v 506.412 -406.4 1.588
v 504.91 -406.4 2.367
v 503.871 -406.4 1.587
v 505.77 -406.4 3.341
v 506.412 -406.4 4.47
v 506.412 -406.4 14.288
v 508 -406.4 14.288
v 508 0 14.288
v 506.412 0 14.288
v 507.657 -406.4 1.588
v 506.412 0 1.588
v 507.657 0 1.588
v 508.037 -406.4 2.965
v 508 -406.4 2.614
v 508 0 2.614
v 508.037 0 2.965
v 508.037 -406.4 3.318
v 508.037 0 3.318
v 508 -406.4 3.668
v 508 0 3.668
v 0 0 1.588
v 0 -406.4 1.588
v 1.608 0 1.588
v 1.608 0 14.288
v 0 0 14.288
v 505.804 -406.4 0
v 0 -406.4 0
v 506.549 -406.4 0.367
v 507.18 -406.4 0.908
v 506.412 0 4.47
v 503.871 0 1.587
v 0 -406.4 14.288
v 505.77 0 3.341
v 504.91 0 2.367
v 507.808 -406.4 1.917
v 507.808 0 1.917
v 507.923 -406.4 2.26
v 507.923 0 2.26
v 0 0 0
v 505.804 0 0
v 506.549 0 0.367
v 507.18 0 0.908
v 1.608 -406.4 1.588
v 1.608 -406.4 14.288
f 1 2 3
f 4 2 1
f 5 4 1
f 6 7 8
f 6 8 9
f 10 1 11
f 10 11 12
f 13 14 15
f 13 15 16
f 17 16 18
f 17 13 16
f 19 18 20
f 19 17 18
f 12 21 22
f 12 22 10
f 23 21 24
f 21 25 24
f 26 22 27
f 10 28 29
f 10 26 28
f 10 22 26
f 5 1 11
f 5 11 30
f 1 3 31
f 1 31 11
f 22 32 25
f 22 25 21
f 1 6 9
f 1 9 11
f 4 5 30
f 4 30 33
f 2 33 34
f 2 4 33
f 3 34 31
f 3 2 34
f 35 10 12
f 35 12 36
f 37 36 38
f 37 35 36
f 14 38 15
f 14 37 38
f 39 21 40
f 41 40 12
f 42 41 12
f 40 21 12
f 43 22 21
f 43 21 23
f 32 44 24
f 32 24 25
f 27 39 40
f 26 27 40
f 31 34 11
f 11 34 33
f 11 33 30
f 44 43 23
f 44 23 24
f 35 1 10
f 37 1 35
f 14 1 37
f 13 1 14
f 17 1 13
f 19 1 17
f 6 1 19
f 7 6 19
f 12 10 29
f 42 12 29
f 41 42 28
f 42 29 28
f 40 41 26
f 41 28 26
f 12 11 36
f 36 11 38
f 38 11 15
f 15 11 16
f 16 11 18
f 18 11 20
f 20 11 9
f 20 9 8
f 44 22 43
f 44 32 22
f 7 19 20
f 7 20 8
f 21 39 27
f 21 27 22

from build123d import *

# Parameters (mm, degrees)
F0_W     = 508
F0_H     = 1.5875
F1_DEPTH = 406.4
F4_DEPTH = 406.4
F5_DEPTH = 406.4
F6_DEPTH = 406.401


# Not quite as in the source:
# - a feature of the source that left no trace in its solid (it failed there, or was rolled back) is left out


with BuildPart() as f1:
    # F0 (on Front) → F1 (new body)
    with BuildSketch(Plane.XZ):
        with Locations((254, 0.79375)):
            Rectangle(F0_W, F0_H)
    extrude(amount=F1_DEPTH)

    # F2 (on face) → F6 (cut, through all)
    with BuildSketch(Plane.XZ.offset(406.4)):
        with BuildLine():
            ThreePointArc((507.6565132189, 1.5875), (506.8812439632, 0.6176396397), (505.8041214943, 0))
            Line((505.8041214943, 0), (508, 0))
            Line((508, 0), (508, 1.5875))
            Line((508, 1.5875), (507.6565132189, 1.5875))
        make_face()
        with BuildLine():
            Line((508, 3.6682041828), (508, 2.6142150412))
            ThreePointArc((508, 2.6142150412), (508.0420476883, 3.141209612), (508, 3.6682041828))
        make_face()
    extrude(amount=-F6_DEPTH, mode=Mode.SUBTRACT)


with BuildPart() as f4:
    # F2 (on face) → F4 (new body)
    with BuildSketch(Plane.XZ.offset(406.4)):
        Polygon((0, 9.3688843772), (0, 1.5875), (1.6079572961, 1.5875), (1.6079572961, 14.2875), (0, 14.2875), (0, 9.9055850878), align=None)
    extrude(amount=-F4_DEPTH)


with BuildPart() as f4b:
    # F2 (on face) → F4, piece 2 (new body)
    with BuildSketch(Plane.XZ.offset(406.4)):
        with BuildLine():
            Line((506.4125, 14.2875), (506.4125, 4.4695332181))
            Line((506.4125, 4.4695332181), (506.4125, 1.5875))
            Line((506.4125, 1.5875), (507.6565132189, 1.5875))
            ThreePointArc((507.6565132189, 1.5875), (507.870344829, 2.0867769369), (508, 2.6142150412))
            Line((508, 2.6142150412), (508, 3.6682041828))
            Line((508, 3.6682041828), (508, 14.2875))
            Line((508, 14.2875), (506.4125, 14.2875))
        make_face()
        with BuildLine():
            Line((508, 3.6682041828), (508, 2.6142150412))
            ThreePointArc((508, 2.6142150412), (508.0420476883, 3.141209612), (508, 3.6682041828))
        make_face()
    extrude(amount=-F4_DEPTH)


with BuildPart() as f5:
    # F2 (on face) → F5 (new body)
    with BuildSketch(Plane.XZ.offset(406.4)):
        with BuildLine():
            ThreePointArc((506.4125, 4.4695332181), (505.364992625, 2.8316639404), (503.8710235621, 1.5875))
            Line((503.8710235621, 1.5875), (506.4125, 1.5875))
            Line((506.4125, 1.5875), (506.4125, 4.4695332181))
        make_face()
    extrude(amount=-F5_DEPTH)


solid = Compound([f1.part, f4.part, f4b.part, f5.part])
